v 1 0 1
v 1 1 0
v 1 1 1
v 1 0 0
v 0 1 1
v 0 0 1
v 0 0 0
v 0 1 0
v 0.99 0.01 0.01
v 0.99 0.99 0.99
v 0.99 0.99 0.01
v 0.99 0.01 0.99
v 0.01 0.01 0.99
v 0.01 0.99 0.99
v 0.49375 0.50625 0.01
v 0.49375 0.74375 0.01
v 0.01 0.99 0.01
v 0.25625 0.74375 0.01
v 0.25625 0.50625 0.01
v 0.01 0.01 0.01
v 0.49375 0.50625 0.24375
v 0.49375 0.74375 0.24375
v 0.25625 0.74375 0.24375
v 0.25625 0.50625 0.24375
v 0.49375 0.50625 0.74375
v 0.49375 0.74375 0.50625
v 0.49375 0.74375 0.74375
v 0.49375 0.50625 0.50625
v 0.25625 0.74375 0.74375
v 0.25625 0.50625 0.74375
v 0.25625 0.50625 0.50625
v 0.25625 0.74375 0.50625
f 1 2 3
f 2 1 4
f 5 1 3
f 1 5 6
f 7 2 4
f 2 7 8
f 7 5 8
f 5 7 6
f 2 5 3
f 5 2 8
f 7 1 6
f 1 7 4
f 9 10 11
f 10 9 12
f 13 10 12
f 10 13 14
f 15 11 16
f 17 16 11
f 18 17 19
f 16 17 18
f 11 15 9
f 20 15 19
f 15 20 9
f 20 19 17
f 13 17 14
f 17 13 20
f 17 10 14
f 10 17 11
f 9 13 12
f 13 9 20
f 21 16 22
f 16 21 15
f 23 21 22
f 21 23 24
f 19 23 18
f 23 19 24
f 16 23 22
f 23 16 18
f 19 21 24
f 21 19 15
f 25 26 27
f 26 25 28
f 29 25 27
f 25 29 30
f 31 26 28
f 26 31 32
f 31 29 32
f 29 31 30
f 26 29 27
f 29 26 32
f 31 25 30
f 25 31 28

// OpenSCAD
translate([0.375, 0.625, 0.125]) color([0.21439919344985514, 0.4167057873106884, 0.6193494045718565]) cube([0.2375, 0.2375, 0.2375], center=true);
translate([0.375, 0.625, 0.625]) color([0.45760594266221877, 0.8933837090972113, 0.8109172526149769]) cube([0.2375, 0.2375, 0.2375], center=true);
color([0.3,0.3,0.3,0.3]) difference() { cube([1,1,1]); translate([0.01,0.01,0.01]) cube([0.98,0.98,0.98]); }
